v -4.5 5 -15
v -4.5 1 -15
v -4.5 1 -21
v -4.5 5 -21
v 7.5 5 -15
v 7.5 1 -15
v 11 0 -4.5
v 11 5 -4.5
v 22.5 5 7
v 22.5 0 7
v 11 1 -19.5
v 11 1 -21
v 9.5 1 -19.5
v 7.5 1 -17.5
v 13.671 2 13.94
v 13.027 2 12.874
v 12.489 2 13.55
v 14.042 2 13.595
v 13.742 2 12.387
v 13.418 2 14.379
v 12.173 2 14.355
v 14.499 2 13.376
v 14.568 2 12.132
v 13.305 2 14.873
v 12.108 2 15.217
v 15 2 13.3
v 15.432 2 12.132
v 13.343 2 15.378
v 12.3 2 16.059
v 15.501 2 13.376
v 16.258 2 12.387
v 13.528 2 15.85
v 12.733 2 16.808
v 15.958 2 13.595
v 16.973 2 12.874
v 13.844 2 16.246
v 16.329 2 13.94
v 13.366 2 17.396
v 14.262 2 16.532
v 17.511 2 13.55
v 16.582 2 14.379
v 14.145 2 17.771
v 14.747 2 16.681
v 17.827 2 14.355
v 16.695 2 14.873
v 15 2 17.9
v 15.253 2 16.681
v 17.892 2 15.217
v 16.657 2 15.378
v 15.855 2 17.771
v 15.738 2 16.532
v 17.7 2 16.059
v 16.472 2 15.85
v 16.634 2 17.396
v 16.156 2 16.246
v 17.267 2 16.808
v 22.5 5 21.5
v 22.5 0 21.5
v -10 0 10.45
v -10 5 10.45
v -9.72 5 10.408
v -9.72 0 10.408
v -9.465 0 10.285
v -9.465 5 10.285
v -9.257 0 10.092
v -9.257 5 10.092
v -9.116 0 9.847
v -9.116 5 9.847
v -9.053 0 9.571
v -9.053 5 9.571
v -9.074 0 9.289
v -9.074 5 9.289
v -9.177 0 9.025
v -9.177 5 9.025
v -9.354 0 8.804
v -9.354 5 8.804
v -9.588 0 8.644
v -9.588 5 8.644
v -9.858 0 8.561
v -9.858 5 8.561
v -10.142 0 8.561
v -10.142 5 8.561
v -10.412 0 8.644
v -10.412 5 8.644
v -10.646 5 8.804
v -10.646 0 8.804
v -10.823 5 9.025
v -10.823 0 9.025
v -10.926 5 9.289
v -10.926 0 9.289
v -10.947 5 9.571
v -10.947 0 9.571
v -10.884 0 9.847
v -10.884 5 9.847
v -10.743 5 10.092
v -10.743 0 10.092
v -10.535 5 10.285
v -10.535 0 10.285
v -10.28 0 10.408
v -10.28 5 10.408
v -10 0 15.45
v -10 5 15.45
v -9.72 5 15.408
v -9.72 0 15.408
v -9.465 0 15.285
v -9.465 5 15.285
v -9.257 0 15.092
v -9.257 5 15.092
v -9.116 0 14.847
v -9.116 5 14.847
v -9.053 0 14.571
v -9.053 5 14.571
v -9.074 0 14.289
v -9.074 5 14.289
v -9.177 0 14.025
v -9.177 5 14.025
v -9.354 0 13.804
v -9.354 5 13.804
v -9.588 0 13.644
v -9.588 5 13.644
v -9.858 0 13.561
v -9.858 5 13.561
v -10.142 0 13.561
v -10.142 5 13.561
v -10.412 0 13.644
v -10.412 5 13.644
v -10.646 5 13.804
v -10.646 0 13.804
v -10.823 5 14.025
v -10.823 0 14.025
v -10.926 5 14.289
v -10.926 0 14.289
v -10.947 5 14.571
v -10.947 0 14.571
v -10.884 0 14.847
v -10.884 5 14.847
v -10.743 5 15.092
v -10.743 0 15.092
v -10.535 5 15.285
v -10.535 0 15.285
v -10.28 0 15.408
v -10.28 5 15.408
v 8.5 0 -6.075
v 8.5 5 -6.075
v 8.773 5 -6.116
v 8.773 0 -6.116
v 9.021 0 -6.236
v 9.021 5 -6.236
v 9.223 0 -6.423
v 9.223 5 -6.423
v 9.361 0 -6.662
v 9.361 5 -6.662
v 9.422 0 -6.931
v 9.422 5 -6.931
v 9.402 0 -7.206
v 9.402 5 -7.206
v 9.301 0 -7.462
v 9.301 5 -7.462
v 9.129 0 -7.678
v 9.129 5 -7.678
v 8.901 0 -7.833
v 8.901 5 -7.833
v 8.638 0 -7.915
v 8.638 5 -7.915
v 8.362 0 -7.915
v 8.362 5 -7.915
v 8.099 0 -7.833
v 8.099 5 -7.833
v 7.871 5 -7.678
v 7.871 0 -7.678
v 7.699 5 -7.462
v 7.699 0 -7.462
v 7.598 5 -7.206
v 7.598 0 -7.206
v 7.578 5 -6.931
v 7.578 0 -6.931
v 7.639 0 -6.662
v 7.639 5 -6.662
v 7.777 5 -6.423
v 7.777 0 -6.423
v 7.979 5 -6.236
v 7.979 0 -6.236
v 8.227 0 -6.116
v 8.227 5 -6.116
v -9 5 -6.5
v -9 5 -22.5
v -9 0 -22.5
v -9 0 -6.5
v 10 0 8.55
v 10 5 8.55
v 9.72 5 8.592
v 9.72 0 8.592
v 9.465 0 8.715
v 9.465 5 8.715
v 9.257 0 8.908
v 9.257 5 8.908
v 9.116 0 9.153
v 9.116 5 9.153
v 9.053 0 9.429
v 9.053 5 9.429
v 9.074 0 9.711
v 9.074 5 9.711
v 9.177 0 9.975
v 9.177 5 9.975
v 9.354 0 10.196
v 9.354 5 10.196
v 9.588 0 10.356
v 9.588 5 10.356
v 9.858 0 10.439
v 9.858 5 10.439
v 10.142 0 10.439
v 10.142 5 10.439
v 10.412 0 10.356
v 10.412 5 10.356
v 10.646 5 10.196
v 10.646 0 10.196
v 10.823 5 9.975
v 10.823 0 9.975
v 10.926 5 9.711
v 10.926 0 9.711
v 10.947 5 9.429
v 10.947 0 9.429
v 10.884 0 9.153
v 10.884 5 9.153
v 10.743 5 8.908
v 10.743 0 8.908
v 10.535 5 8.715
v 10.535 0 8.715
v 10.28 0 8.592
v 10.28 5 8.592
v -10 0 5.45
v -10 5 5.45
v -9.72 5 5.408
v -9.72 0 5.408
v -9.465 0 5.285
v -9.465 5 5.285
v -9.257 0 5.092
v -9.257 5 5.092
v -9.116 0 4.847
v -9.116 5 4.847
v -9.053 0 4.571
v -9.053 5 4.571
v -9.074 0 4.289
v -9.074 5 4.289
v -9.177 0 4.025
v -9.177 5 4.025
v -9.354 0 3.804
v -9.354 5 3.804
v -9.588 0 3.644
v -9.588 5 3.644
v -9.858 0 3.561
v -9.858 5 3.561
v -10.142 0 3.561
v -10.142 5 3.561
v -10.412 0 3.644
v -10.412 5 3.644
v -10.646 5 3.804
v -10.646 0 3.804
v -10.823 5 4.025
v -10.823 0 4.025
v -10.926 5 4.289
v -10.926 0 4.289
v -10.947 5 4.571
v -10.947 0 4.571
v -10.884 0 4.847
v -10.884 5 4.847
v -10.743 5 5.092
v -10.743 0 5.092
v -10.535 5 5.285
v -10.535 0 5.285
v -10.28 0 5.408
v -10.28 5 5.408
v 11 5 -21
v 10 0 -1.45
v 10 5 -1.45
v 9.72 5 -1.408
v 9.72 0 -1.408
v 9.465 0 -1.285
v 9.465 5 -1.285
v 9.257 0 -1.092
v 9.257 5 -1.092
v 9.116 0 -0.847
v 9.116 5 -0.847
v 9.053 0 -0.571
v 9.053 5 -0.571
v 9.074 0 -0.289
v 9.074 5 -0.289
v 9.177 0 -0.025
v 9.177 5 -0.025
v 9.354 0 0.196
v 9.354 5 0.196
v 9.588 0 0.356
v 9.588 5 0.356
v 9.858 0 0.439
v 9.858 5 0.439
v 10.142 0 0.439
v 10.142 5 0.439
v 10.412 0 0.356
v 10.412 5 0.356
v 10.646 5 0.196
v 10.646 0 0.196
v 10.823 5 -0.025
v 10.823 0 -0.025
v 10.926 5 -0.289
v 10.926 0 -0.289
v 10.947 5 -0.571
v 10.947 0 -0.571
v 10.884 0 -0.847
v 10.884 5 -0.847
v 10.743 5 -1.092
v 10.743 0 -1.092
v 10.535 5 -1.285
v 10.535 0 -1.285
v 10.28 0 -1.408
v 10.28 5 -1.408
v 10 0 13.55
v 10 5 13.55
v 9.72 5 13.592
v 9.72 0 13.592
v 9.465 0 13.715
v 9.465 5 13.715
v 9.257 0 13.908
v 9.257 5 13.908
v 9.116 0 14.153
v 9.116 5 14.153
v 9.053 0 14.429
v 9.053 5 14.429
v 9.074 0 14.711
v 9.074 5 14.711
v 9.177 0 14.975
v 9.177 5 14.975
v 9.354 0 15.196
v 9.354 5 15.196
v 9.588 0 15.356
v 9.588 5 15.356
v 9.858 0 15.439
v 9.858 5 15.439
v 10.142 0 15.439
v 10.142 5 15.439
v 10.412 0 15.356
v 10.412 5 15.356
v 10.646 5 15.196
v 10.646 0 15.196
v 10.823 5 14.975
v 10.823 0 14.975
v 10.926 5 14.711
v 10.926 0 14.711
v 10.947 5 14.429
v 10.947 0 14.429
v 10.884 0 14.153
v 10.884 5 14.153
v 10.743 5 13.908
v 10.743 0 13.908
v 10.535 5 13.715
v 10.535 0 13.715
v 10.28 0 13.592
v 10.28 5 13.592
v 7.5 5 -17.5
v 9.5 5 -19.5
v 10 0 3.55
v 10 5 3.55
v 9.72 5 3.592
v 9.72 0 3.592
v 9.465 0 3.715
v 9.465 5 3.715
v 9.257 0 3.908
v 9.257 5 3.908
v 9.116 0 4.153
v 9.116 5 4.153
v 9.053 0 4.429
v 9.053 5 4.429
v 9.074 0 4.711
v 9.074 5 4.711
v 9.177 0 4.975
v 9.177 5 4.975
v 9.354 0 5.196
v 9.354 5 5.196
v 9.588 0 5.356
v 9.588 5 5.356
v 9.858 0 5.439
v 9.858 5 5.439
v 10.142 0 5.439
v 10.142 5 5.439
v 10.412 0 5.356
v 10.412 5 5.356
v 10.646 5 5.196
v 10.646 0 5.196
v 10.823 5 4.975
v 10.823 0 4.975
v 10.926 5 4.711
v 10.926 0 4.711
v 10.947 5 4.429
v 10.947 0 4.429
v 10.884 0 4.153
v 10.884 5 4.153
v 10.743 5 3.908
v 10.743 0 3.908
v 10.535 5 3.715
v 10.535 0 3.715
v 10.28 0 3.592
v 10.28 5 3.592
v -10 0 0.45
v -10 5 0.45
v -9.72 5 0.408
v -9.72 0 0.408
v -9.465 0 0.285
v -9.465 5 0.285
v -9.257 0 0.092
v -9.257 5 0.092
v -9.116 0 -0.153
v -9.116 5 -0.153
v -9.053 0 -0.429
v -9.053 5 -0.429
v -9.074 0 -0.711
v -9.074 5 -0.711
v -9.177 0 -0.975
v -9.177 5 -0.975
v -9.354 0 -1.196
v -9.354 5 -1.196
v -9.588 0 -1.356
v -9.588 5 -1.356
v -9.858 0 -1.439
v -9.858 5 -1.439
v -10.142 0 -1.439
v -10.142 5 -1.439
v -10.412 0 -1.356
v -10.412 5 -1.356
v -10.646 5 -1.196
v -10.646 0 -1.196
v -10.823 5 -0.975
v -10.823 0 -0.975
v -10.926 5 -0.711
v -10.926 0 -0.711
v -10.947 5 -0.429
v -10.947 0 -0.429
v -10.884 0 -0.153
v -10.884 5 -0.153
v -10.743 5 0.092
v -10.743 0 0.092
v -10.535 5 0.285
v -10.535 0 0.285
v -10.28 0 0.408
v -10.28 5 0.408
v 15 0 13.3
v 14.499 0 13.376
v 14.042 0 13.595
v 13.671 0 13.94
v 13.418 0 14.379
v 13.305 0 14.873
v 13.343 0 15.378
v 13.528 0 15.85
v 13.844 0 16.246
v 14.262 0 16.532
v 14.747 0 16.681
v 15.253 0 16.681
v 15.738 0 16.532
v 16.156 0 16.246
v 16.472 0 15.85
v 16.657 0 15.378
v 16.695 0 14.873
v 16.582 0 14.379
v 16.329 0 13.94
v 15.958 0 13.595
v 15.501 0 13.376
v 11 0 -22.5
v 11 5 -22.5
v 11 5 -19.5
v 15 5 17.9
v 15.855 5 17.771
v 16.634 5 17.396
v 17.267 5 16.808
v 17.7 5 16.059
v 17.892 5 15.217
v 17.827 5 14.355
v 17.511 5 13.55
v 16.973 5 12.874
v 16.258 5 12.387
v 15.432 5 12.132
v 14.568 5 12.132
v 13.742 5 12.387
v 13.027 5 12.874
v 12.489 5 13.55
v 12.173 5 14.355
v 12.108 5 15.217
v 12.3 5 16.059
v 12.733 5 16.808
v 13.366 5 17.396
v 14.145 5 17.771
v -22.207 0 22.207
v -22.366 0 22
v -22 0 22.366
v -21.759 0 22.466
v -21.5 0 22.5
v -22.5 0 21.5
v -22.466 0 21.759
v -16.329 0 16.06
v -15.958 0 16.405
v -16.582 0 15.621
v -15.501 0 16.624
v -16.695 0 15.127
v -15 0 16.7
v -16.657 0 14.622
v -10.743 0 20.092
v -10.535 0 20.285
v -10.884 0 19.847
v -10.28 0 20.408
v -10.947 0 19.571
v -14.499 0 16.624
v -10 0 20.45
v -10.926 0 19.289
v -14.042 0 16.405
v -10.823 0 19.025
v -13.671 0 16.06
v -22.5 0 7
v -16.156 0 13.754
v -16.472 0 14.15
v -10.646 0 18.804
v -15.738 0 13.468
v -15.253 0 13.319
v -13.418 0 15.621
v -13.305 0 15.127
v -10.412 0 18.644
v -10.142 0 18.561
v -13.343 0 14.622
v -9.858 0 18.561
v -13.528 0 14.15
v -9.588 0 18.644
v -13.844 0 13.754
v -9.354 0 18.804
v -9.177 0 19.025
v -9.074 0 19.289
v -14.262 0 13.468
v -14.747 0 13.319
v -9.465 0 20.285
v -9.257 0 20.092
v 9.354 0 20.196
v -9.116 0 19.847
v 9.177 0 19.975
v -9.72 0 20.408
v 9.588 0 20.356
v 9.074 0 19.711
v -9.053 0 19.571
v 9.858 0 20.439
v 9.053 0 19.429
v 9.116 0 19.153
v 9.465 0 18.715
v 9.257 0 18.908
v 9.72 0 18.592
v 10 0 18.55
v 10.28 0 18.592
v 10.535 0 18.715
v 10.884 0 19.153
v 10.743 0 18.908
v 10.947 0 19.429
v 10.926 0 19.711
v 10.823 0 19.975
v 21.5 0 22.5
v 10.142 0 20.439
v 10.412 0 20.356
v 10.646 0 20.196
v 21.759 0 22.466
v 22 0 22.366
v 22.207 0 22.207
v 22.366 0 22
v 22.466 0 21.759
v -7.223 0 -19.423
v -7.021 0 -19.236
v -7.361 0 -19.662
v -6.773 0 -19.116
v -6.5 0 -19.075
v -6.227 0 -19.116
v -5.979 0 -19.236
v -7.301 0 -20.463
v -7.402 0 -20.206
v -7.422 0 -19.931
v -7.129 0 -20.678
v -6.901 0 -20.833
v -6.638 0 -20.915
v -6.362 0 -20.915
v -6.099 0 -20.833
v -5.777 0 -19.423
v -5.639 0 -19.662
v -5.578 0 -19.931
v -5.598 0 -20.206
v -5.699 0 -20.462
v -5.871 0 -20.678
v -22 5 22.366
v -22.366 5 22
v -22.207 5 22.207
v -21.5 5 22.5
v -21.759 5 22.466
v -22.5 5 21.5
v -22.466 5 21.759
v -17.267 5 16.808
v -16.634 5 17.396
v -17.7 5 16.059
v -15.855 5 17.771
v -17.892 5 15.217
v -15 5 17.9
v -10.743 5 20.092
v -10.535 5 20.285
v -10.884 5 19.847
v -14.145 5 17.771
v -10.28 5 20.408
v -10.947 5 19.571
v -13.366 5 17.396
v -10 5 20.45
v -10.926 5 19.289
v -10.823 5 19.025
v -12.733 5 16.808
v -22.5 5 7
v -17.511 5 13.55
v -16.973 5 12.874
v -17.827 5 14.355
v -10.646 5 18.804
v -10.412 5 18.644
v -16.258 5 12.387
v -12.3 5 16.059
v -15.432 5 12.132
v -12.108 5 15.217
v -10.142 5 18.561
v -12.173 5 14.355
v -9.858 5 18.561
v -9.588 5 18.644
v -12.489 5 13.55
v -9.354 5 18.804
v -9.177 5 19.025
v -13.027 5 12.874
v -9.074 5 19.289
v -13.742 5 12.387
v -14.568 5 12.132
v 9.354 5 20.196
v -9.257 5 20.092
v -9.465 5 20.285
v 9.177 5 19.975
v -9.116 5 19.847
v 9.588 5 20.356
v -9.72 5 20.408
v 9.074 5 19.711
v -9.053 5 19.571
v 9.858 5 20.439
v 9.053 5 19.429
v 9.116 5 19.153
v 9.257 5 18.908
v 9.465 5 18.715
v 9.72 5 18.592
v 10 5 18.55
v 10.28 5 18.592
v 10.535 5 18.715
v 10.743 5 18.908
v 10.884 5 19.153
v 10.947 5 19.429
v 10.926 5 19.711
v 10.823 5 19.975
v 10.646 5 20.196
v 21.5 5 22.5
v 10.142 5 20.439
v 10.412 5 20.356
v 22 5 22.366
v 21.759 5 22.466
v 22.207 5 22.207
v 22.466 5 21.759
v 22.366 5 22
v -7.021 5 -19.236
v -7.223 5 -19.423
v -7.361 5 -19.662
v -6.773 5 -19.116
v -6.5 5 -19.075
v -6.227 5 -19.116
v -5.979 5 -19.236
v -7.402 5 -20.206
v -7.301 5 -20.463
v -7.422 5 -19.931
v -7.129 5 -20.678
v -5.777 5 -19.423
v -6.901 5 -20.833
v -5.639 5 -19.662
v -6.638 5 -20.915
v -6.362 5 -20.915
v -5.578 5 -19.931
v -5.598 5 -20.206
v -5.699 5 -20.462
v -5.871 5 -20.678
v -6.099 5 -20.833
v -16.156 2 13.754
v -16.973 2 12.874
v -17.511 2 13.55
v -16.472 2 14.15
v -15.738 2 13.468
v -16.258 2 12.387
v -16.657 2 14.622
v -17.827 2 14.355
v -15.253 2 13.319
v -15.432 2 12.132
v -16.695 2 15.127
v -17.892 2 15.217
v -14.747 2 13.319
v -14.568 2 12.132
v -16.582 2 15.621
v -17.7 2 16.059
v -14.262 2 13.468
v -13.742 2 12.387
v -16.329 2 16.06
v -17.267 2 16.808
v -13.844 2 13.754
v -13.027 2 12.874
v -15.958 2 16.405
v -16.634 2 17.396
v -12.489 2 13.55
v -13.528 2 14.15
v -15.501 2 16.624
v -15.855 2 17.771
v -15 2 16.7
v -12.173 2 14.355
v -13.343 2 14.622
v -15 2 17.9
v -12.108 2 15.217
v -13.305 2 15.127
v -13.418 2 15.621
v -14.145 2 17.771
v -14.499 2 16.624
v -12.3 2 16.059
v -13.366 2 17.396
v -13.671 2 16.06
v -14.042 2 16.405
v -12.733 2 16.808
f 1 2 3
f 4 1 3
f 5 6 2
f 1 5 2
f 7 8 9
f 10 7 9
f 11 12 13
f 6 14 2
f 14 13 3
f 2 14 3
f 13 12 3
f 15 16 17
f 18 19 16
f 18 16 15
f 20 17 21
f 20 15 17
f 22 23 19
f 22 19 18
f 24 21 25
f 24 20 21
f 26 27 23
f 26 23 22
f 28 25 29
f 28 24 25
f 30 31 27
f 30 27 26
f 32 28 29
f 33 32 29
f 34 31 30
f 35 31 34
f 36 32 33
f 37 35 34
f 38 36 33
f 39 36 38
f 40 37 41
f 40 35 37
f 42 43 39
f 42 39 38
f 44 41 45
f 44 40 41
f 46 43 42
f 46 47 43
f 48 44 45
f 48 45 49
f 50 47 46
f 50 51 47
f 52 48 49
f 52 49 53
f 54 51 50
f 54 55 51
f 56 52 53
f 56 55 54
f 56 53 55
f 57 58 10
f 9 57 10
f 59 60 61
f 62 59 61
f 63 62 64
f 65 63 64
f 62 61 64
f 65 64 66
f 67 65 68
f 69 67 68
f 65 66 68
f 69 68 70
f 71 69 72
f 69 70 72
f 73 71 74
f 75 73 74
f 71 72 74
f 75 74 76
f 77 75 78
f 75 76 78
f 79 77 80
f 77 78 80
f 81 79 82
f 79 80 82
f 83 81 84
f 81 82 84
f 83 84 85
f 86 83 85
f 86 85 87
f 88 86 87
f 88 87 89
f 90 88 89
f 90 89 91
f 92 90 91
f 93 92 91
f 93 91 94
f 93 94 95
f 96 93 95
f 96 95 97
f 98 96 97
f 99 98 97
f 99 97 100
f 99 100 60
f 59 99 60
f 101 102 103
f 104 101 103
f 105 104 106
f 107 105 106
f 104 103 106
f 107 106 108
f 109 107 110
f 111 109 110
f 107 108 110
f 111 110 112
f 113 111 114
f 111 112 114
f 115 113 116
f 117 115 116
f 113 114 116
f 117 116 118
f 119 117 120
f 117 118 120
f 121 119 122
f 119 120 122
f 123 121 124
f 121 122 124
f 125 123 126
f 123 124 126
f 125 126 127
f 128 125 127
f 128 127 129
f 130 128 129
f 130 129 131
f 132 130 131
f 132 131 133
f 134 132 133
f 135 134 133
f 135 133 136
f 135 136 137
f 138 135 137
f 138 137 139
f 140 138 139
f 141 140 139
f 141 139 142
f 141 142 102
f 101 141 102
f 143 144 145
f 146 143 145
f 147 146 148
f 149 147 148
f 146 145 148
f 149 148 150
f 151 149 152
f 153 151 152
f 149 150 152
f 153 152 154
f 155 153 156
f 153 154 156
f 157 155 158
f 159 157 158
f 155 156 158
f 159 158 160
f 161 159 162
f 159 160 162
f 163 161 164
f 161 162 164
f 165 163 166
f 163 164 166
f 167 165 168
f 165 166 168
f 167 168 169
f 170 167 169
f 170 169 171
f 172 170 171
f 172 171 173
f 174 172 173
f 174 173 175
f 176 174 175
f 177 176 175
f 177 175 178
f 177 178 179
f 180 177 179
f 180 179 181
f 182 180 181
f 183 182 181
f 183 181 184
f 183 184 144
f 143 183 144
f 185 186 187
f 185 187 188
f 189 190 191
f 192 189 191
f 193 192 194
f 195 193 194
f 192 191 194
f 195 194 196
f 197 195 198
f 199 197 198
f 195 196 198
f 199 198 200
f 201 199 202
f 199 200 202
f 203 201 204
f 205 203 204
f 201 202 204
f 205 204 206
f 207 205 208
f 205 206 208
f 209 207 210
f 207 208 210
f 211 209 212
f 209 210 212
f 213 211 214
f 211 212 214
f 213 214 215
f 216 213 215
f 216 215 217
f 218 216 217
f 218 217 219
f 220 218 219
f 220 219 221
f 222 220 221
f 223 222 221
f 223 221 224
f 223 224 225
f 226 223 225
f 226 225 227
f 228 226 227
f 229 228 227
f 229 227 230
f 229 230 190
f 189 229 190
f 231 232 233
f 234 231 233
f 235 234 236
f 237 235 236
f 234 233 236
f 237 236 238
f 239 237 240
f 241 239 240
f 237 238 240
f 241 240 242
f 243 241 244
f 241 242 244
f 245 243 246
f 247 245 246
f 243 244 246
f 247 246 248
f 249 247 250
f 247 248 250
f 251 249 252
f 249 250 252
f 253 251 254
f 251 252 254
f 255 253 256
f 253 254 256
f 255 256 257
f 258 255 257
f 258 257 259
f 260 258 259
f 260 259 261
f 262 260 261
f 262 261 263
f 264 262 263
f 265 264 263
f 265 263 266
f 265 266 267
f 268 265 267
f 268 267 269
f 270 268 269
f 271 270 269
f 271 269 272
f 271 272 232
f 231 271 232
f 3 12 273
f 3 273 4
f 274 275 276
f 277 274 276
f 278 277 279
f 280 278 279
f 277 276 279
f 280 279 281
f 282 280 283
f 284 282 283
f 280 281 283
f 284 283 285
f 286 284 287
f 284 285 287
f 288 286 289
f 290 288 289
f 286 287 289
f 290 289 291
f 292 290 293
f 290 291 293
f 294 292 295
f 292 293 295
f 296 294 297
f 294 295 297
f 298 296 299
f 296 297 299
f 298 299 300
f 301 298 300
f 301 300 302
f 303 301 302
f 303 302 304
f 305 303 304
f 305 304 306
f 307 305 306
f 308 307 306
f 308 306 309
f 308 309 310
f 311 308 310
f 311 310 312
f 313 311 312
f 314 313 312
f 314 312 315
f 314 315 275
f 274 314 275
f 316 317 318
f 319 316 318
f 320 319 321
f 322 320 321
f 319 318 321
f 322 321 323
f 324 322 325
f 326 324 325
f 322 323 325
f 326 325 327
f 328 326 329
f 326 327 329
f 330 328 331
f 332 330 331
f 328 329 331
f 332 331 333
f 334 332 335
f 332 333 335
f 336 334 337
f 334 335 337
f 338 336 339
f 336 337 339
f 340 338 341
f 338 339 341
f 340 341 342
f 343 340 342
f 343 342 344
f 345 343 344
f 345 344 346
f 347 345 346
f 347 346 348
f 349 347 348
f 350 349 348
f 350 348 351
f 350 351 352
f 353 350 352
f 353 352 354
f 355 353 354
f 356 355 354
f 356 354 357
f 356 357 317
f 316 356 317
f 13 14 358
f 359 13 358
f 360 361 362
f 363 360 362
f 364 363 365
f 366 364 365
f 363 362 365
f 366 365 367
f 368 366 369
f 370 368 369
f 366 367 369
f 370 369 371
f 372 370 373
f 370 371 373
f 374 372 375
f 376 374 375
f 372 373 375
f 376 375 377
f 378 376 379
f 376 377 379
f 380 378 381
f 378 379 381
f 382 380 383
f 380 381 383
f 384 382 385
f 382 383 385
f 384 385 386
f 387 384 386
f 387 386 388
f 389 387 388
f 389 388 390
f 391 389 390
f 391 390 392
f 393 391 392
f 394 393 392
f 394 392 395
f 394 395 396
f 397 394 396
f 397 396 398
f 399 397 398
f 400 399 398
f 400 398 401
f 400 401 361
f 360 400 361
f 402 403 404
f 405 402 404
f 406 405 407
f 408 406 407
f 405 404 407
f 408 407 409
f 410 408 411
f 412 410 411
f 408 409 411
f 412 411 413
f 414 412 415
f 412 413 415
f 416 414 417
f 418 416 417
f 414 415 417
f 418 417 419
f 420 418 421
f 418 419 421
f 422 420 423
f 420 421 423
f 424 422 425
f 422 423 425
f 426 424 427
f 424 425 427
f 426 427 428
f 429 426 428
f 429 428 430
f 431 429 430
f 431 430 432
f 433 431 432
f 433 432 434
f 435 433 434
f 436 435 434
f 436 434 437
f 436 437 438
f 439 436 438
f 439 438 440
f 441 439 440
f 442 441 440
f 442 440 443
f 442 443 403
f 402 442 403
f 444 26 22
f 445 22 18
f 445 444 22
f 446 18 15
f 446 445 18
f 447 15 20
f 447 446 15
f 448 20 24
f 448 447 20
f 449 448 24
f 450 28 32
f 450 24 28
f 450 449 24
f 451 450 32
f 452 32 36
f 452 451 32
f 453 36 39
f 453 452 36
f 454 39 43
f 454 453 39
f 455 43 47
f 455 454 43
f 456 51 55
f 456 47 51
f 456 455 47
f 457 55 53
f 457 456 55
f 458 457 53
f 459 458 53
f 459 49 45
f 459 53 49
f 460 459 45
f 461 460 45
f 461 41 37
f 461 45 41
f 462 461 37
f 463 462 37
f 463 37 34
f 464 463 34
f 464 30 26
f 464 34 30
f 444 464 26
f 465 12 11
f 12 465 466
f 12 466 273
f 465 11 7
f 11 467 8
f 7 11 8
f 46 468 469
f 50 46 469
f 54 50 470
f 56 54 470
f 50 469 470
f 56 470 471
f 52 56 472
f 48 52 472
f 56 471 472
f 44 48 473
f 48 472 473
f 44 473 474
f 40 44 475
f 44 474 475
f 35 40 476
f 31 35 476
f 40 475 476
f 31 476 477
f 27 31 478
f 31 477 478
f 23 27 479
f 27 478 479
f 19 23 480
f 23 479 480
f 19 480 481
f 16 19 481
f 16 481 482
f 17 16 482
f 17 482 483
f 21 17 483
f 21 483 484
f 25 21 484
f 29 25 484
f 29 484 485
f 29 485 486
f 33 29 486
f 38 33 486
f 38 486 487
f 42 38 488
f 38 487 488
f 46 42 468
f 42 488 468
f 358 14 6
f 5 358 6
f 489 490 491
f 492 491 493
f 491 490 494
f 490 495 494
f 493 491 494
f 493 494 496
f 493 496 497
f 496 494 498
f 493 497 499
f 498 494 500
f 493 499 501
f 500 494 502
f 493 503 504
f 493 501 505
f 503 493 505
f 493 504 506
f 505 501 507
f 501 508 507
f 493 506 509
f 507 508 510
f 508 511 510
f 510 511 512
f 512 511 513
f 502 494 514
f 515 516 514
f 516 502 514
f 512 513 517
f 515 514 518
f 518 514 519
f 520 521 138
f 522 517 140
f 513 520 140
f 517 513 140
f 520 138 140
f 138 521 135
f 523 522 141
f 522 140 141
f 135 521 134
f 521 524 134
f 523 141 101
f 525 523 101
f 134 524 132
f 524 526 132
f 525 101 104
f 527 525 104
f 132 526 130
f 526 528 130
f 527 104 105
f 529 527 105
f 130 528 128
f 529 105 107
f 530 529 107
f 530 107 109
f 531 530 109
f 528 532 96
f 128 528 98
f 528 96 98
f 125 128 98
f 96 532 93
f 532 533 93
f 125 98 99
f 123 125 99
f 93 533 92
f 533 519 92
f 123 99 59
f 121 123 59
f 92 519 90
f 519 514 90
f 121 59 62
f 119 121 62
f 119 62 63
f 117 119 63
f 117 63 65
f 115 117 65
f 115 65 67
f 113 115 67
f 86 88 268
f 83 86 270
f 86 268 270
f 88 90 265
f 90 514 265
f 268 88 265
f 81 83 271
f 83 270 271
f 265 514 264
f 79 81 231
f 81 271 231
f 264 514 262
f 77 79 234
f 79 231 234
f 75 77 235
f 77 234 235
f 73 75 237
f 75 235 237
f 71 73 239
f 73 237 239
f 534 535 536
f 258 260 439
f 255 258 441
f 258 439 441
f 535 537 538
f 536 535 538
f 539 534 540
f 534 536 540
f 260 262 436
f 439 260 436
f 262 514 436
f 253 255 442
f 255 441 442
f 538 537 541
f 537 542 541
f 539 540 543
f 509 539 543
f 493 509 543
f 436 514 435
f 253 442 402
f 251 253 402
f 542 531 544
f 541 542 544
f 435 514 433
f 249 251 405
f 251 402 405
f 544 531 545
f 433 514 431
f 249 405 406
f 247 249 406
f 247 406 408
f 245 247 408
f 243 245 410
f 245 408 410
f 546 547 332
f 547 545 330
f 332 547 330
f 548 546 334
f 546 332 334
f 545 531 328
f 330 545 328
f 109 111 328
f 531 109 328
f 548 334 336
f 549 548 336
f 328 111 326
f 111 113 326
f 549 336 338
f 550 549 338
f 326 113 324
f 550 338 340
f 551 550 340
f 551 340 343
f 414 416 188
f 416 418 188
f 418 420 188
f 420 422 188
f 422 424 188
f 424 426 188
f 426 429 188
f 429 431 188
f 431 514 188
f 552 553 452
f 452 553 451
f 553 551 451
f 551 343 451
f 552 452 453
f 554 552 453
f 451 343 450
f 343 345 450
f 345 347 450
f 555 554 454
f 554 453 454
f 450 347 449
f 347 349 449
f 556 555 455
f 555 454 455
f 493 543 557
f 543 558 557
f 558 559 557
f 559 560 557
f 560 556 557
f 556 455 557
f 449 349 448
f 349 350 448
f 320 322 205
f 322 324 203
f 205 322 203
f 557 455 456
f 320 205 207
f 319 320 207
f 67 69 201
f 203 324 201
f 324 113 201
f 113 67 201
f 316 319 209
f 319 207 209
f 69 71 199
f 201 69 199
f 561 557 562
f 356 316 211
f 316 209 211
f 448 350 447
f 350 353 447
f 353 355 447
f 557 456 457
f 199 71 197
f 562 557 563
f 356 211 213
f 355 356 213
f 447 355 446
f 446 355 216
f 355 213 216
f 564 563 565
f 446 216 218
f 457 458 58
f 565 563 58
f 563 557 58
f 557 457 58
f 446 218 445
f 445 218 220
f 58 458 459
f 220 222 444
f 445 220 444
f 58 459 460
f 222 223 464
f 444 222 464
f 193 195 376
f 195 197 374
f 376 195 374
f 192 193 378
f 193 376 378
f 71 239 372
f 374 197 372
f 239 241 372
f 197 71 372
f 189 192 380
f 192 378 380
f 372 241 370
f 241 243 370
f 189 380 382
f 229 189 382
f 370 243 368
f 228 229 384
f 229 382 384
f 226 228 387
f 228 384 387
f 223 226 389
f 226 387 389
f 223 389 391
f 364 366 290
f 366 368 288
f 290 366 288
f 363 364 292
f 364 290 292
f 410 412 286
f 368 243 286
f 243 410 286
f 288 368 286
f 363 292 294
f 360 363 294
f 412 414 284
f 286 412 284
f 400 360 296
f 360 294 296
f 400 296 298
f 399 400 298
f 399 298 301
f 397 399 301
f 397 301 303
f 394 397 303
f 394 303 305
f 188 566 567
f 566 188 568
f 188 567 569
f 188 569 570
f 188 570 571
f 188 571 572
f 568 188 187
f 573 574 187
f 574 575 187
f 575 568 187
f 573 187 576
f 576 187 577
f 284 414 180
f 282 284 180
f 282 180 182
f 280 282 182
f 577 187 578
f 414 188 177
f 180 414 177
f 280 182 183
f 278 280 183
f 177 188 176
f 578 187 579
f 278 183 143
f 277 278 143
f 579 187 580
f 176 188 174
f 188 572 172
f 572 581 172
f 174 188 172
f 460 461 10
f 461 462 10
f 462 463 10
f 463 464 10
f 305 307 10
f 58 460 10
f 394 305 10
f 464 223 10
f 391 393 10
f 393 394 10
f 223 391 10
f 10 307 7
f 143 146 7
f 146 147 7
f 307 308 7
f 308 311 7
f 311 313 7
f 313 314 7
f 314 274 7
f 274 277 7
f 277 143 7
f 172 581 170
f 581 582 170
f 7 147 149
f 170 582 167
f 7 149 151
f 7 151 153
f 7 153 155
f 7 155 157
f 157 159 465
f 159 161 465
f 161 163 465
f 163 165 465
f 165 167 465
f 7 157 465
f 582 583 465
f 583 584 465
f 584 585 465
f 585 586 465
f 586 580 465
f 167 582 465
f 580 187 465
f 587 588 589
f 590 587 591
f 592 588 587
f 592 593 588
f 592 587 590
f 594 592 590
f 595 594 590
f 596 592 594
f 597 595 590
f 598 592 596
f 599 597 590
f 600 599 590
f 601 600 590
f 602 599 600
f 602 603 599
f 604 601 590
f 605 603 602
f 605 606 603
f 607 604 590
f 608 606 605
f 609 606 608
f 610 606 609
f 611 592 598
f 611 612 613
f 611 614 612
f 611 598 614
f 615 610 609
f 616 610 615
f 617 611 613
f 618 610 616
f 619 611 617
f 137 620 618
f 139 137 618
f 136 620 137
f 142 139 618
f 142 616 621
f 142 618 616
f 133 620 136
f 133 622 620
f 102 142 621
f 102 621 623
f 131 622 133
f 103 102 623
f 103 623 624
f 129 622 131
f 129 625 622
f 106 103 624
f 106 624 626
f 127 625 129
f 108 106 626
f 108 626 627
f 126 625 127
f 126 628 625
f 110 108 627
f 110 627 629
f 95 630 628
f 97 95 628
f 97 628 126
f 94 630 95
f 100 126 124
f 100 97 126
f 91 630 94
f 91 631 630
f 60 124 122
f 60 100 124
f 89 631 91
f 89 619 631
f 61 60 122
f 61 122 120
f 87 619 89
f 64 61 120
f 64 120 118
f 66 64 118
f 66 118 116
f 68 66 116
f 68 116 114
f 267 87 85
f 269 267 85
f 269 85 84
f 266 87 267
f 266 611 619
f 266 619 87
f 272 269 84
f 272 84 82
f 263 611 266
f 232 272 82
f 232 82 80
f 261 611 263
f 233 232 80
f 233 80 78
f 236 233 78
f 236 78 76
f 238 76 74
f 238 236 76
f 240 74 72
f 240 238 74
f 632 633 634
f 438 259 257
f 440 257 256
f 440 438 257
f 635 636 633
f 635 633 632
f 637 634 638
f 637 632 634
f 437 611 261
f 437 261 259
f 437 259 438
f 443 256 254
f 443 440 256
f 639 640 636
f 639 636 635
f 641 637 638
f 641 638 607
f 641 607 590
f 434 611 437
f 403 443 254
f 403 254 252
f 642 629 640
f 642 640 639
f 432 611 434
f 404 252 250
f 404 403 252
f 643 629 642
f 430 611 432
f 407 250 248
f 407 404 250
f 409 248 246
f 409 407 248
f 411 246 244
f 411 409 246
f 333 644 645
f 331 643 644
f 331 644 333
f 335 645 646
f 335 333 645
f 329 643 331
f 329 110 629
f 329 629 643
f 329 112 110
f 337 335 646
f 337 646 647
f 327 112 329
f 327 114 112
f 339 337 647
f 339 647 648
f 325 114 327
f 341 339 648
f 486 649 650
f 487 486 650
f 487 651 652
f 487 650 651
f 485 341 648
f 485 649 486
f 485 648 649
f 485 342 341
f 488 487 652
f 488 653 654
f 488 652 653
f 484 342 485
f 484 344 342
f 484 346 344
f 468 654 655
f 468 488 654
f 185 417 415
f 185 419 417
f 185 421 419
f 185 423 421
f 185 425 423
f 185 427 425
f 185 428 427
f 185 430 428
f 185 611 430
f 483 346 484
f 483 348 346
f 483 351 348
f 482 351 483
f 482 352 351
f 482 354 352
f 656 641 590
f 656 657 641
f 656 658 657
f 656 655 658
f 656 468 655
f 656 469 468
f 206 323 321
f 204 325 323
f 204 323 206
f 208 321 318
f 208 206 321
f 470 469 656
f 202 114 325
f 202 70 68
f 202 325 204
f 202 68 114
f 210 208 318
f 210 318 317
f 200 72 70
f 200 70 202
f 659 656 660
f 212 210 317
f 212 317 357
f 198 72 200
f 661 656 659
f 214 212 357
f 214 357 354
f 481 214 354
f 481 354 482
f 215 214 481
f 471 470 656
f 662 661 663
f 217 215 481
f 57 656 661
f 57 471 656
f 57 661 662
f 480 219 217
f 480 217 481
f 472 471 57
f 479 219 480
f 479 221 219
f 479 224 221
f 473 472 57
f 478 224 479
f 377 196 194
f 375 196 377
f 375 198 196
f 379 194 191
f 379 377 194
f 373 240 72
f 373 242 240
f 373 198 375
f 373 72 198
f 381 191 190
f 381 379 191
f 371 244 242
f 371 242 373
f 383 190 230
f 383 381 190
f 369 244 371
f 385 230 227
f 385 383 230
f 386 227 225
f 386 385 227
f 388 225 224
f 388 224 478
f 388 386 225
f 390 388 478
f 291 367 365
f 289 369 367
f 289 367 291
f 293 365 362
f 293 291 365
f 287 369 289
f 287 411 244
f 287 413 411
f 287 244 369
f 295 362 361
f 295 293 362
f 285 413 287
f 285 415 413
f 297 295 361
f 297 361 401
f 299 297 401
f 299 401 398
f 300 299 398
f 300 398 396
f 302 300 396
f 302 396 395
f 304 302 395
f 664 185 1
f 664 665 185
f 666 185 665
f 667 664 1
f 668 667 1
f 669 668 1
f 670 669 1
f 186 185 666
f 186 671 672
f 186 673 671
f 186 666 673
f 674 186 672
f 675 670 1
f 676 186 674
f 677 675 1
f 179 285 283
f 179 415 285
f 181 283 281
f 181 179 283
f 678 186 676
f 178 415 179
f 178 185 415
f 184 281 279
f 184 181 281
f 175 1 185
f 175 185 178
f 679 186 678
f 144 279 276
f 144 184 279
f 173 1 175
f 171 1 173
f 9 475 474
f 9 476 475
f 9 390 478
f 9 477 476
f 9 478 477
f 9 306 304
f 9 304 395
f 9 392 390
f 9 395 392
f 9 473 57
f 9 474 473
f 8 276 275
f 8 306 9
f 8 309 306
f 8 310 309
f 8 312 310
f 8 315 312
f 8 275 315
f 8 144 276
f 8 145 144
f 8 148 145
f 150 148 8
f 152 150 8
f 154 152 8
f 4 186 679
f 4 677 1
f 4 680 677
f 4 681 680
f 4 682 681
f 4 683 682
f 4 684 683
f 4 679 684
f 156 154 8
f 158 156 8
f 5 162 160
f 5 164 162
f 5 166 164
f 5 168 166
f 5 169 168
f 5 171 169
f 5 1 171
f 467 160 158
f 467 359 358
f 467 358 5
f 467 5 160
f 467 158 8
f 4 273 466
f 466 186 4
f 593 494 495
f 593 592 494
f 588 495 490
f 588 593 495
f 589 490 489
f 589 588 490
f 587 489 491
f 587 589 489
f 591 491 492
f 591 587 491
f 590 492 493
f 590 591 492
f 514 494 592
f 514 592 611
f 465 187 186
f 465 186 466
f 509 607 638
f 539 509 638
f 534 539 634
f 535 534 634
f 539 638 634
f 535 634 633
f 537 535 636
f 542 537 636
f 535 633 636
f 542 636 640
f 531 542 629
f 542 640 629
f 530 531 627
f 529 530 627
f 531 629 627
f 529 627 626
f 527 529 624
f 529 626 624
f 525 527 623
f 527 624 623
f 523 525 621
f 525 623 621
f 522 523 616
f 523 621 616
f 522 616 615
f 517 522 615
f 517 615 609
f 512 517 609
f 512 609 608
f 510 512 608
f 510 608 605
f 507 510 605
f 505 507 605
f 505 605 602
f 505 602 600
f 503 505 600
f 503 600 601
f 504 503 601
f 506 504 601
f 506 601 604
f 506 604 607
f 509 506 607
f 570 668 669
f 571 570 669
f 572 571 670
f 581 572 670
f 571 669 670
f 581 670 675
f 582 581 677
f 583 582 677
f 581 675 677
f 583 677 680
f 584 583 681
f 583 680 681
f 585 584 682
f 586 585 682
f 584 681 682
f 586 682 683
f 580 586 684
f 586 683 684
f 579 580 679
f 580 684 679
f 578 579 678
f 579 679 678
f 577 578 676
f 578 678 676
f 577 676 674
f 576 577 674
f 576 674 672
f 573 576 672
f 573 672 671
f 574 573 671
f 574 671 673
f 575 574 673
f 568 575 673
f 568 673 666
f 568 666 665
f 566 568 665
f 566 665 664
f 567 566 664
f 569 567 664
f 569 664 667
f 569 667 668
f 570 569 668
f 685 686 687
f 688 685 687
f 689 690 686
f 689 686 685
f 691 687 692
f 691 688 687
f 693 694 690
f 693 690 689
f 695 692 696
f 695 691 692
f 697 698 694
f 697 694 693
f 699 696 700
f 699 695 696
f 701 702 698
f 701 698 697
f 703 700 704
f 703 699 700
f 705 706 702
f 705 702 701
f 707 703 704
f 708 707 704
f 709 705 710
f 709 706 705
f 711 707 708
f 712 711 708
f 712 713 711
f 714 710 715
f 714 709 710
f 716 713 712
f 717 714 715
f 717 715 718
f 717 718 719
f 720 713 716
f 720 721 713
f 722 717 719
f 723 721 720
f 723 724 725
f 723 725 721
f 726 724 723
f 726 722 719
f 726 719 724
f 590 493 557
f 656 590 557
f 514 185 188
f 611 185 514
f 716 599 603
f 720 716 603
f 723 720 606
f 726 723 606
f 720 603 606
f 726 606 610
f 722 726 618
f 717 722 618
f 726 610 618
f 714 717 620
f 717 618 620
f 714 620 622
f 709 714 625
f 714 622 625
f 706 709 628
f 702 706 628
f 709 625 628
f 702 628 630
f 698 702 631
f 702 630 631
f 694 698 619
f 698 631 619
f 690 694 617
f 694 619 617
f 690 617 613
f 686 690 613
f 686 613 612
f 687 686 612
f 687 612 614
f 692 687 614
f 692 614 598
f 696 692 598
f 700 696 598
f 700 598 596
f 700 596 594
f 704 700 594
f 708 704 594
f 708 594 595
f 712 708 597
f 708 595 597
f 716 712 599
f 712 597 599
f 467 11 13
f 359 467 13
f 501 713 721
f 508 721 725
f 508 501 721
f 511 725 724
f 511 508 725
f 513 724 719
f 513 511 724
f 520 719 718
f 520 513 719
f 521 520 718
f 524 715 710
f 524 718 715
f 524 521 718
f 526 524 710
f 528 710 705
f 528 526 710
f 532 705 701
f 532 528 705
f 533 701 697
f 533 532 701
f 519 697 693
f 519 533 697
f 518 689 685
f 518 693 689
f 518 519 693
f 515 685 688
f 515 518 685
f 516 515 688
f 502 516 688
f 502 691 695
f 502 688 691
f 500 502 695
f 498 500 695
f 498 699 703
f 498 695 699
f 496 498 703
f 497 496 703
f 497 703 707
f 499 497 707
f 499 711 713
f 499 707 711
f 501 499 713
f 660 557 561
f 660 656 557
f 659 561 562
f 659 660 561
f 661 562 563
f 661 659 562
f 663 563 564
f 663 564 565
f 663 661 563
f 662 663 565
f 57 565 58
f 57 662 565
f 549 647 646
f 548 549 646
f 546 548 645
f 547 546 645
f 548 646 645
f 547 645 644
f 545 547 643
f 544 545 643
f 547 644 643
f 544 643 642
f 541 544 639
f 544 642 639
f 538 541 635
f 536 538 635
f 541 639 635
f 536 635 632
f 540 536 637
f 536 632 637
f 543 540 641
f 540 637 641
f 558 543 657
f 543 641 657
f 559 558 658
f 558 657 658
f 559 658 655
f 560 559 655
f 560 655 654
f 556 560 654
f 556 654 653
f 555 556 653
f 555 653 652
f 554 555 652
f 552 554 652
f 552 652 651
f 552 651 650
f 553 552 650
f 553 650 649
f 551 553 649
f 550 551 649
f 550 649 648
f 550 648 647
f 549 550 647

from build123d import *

# Parameters (mm, degrees)
SKETCH1_W           = 45
SKETCH1_H           = 45
SKETCH1_R           = 1.7
BOSS_EXTRUDE1_DEPTH = 5
SKETCH7_R           = 2.9
CUT_EXTRUDE6_DEPTH  = 3
SKETCH4_R           = 0.925
CUT_EXTRUDE3_DEPTH  = 33.210246817
SKETCH5_R           = 0.95
CUT_EXTRUDE4_DEPTH  = 33.210246817
LPATTERN1_COUNT     = 5
LPATTERN1_PITCH     = 5
FILLET1_R           = 1
CUT_EXTRUDE7_START  = -4
CUT_EXTRUDE7_DEPTH  = 4
FILLET2_R           = 3
CHAMFER2_SIZE       = 2
CUT_EXTRUDE8_DEPTH  = 33.210246817


with BuildPart() as part:
    # Sketch1 → Boss-Extrude1 (new body)
    with BuildSketch(Plane(origin=(0, 0, 0), x_dir=(1, 0, 0), z_dir=(0, 1, 0))):
        Rectangle(SKETCH1_W, SKETCH1_H)
        with Locations(Location((-15, 15, 0), (0, 0, 270))):
            Circle(SKETCH1_R, mode=Mode.SUBTRACT)
        with Locations(Location((-15, -15, 0), (0, 0, 270))):
            Circle(SKETCH1_R, mode=Mode.SUBTRACT)
        with Locations(Location((15, -15, 0), (0, 0, 90))):
            Circle(SKETCH1_R, mode=Mode.SUBTRACT)
        with Locations(Location((15, 15, 0), (0, 0, 90))):
            Circle(SKETCH1_R, mode=Mode.SUBTRACT)
    extrude(amount=BOSS_EXTRUDE1_DEPTH)

    # Sketch7 → Cut-Extrude6 (cut)
    with BuildSketch(Plane(origin=(0, 5, 0), x_dir=(1, 0, 0), z_dir=(0, 1, 0))):
        with Locations(Location((-15, 15, 0), (0, 0, 270))):
            Circle(SKETCH7_R)
        with Locations(Location((15, 15, 0), (0, 0, 270))):
            Circle(SKETCH7_R)
        with Locations(Location((-15, -15, 0), (0, 0, 270))):
            Circle(SKETCH7_R)
        with Locations(Location((15, -15, 0), (0, 0, 270))):
            Circle(SKETCH7_R)
    extrude(amount=-CUT_EXTRUDE6_DEPTH, mode=Mode.SUBTRACT)

    # Sketch4 → Cut-Extrude3 (cut, through all)
    with BuildSketch(Plane(origin=(0, 5, 0), x_dir=(1, 0, 0), z_dir=(0, 1, 0))):
        with Locations(Location((-6.5, 20, 0), (0, 0, 270))):
            Circle(SKETCH4_R)
        with Locations(Location((8.5, 7, 0), (0, 0, 270))):
            Circle(SKETCH4_R)
    extrude(amount=-CUT_EXTRUDE3_DEPTH, mode=Mode.SUBTRACT)

    # Sketch5 → Cut-Extrude4 (cut, through all)
    with BuildSketch(Plane(origin=(0, 5, 0), x_dir=(1, 0, 0), z_dir=(0, 1, 0))):
        with Locations(Location((-10, -19.5, 0), (0, 0, 270))):
            Circle(SKETCH5_R)
        with Locations(Location((10, -19.5, 0), (0, 0, 90))):
            Circle(SKETCH5_R)
    cut_extrude4 = extrude(amount=-CUT_EXTRUDE4_DEPTH, mode=Mode.SUBTRACT)

    # LPattern1: Cut-Extrude4 ×5
    with Locations(*[(0, 0, -i * LPATTERN1_PITCH) for i in range(1, LPATTERN1_COUNT)]):
        add(cut_extrude4, mode=Mode.SUBTRACT)

    # Fillet1
    fillet1_edges = [part.edges().sort_by_distance(p)[0] for p in [
        (22.5, 2.5, 22.5),
        (-22.5, 2.5, 22.5),
        (-22.5, 2.5, -22.5),
        (22.5, 2.5, -22.5),
    ]]
    fillet(fillet1_edges, radius=FILLET1_R)

    # Sketch8 → Cut-Extrude7 (cut)
    with BuildSketch(Plane(origin=(0, 5, 0), x_dir=(1, 0, 0), z_dir=(0, 1, 0)).offset(CUT_EXTRUDE7_START)):
        Polygon((-4.5, 21), (7.5, 21), (15.5, 21), (15.5, 19.5), (7.5, 19.5), (7.5, 15), (-4.5, 15), align=None)
    extrude(amount=CUT_EXTRUDE7_DEPTH, mode=Mode.SUBTRACT)

    # Fillet2
    fillet2_edges = [part.edges().sort_by_distance(p)[0] for p in [
        (15.5, 1, -20.25),
    ]]
    fillet(fillet2_edges, radius=FILLET2_R)

    # Chamfer2
    chamfer2_edges = [part.edges().sort_by_distance(p)[0] for p in [
        (7.5, 3, -19.5),
    ]]
    chamfer(chamfer2_edges, length=CHAMFER2_SIZE)

    # Sketch9 → Cut-Extrude8 (cut, through all)
    with BuildSketch(Plane(origin=(0, 5, 0), x_dir=(1, 0, 0), z_dir=(0, 1, 0))):
        with BuildLine():
            Line((-9, 22.5), (-9, 6.5))
            Line((-9, 6.5), (-22.5, -7))
            Line((-22.5, -7), (-22.5, 21.5))
            ThreePointArc((-22.5, 21.5), (-22.207106781, 22.207106781), (-21.5, 22.5))
            Line((-21.5, 22.5), (-9, 22.5))
        make_face()
        with BuildLine():
            Line((21.5, 22.5), (11, 22.5))
            Line((11, 22.5), (11, 4.5))
            Line((11, 4.5), (22.5, -7))
            Line((22.5, -7), (22.5, 21.5))
            ThreePointArc((22.5, 21.5), (22.207106781, 22.207106781), (21.5, 22.5))
        make_face()
    extrude(amount=-CUT_EXTRUDE8_DEPTH, mode=Mode.SUBTRACT)


solid = part.part
